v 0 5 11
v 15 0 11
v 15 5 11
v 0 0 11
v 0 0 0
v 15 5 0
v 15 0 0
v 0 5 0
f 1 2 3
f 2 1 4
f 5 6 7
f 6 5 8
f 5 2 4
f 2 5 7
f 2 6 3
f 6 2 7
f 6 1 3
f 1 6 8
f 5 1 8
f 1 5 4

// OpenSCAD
// Generated by SolidPython 1.0.1 on 2020-07-29 00:46:55


cube(size = [15, 5, 11]);
/***********************************************
*********      SolidPython code:      **********
************************************************
 
# import packages: SolidPython
from solid import *
from solid.utils import *
from itertools import chain, combinations, permutations


class Resize:

    def __init__(self, scad_file):
        self.scad_file = scad_file
        #self.scad_file = import_scad(scad_file)
        # cone/cylinder param:
        self.r1 = 0
        self.r2 = 0
        self.h = 0
        # rectangular prism param:
        self.w = 0
        self.l = 0
        # ellipse param:
        self.r = 0

    # import OpenScad code (file name corresponds to shape)


    # classify shape + parameters
    def assign(self, param1, param2, param3):
        if self.scad_file == 'cone.scad':
            self.r1 = param1
            self.r2 = param2
            self.h = param3
        elif self.scad_file == 'cylinder.scad':
            self.r1 = param1
            self.r2 = param2
            self.h = param3
        elif self.scad_file == 'rectangularPrism.scad':
            self.h = param1
            self.l = param2
            self.w = param3
        else:
            self.r = param1
            self.h = param2

    # resize parameters
    def iterate(self):
        x = range(3, 20, 2)
        i = 1
        if self.scad_file == 'cone.scad':
            tempList = list(permutations(x, 2))
            for temp in tempList:
                param1 = temp[0]
                param2 = temp[1]
                filepath = 'produced_scad_files/' + 'cone' + str(param1) + '_' + str(param2) + '_' + '.scad'
                scad_render_to_file(cylinder(h=param1, r1=param2, r2=0), filepath)

        elif self.scad_file == 'cylinder.scad':
            tempList = list(permutations(x, 3))
            for temp in tempList:
                param1 = temp[0]
                param2 = temp[1]
                filepath = 'produced_scad_files/' + 'cylinder' + str(param1) + '_' + str(param2) + '_' + '.scad'
                scad_render_to_file(cylinder(h=param1, r1=param2, r2=param2), filepath)

        elif self.scad_file == 'rectangularPrism.scad':
            tempList = list(permutations(x, 3))
            for temp in tempList:
                param1 = temp[0]
                param2 = temp[1]
                param3 = temp[2]
                filepath = 'produced_scad_files/' + 'rectangularPrism' + str(param1) + '_' + str(param2) + '_' + str(
                    param3) + '.scad'
                scad_render_to_file(cube(size=(param1, param2, param3)), filepath)

        elif self.scad_file == 'ellipse.scad':
            tempList = list(permutations(x, 4))
            for temp in tempList:
                param1 = temp[0]
                param2 = temp[1]
                param3 = temp[2]
                param4 = temp[3]
                filepath = 'produced_scad_files/' + 'ellipse' + str(param1) + '_' + str(param2) + '_' + str(param3) + '_' + str(param4) + '.scad'
                scad_render_to_file(scale([param1, param2, param3])(sphere(r=param4)), filepath)

    def render_to_scadfile(self):
        scad_render_to_file(scad, 'example.scad') 
 
************************************************/
